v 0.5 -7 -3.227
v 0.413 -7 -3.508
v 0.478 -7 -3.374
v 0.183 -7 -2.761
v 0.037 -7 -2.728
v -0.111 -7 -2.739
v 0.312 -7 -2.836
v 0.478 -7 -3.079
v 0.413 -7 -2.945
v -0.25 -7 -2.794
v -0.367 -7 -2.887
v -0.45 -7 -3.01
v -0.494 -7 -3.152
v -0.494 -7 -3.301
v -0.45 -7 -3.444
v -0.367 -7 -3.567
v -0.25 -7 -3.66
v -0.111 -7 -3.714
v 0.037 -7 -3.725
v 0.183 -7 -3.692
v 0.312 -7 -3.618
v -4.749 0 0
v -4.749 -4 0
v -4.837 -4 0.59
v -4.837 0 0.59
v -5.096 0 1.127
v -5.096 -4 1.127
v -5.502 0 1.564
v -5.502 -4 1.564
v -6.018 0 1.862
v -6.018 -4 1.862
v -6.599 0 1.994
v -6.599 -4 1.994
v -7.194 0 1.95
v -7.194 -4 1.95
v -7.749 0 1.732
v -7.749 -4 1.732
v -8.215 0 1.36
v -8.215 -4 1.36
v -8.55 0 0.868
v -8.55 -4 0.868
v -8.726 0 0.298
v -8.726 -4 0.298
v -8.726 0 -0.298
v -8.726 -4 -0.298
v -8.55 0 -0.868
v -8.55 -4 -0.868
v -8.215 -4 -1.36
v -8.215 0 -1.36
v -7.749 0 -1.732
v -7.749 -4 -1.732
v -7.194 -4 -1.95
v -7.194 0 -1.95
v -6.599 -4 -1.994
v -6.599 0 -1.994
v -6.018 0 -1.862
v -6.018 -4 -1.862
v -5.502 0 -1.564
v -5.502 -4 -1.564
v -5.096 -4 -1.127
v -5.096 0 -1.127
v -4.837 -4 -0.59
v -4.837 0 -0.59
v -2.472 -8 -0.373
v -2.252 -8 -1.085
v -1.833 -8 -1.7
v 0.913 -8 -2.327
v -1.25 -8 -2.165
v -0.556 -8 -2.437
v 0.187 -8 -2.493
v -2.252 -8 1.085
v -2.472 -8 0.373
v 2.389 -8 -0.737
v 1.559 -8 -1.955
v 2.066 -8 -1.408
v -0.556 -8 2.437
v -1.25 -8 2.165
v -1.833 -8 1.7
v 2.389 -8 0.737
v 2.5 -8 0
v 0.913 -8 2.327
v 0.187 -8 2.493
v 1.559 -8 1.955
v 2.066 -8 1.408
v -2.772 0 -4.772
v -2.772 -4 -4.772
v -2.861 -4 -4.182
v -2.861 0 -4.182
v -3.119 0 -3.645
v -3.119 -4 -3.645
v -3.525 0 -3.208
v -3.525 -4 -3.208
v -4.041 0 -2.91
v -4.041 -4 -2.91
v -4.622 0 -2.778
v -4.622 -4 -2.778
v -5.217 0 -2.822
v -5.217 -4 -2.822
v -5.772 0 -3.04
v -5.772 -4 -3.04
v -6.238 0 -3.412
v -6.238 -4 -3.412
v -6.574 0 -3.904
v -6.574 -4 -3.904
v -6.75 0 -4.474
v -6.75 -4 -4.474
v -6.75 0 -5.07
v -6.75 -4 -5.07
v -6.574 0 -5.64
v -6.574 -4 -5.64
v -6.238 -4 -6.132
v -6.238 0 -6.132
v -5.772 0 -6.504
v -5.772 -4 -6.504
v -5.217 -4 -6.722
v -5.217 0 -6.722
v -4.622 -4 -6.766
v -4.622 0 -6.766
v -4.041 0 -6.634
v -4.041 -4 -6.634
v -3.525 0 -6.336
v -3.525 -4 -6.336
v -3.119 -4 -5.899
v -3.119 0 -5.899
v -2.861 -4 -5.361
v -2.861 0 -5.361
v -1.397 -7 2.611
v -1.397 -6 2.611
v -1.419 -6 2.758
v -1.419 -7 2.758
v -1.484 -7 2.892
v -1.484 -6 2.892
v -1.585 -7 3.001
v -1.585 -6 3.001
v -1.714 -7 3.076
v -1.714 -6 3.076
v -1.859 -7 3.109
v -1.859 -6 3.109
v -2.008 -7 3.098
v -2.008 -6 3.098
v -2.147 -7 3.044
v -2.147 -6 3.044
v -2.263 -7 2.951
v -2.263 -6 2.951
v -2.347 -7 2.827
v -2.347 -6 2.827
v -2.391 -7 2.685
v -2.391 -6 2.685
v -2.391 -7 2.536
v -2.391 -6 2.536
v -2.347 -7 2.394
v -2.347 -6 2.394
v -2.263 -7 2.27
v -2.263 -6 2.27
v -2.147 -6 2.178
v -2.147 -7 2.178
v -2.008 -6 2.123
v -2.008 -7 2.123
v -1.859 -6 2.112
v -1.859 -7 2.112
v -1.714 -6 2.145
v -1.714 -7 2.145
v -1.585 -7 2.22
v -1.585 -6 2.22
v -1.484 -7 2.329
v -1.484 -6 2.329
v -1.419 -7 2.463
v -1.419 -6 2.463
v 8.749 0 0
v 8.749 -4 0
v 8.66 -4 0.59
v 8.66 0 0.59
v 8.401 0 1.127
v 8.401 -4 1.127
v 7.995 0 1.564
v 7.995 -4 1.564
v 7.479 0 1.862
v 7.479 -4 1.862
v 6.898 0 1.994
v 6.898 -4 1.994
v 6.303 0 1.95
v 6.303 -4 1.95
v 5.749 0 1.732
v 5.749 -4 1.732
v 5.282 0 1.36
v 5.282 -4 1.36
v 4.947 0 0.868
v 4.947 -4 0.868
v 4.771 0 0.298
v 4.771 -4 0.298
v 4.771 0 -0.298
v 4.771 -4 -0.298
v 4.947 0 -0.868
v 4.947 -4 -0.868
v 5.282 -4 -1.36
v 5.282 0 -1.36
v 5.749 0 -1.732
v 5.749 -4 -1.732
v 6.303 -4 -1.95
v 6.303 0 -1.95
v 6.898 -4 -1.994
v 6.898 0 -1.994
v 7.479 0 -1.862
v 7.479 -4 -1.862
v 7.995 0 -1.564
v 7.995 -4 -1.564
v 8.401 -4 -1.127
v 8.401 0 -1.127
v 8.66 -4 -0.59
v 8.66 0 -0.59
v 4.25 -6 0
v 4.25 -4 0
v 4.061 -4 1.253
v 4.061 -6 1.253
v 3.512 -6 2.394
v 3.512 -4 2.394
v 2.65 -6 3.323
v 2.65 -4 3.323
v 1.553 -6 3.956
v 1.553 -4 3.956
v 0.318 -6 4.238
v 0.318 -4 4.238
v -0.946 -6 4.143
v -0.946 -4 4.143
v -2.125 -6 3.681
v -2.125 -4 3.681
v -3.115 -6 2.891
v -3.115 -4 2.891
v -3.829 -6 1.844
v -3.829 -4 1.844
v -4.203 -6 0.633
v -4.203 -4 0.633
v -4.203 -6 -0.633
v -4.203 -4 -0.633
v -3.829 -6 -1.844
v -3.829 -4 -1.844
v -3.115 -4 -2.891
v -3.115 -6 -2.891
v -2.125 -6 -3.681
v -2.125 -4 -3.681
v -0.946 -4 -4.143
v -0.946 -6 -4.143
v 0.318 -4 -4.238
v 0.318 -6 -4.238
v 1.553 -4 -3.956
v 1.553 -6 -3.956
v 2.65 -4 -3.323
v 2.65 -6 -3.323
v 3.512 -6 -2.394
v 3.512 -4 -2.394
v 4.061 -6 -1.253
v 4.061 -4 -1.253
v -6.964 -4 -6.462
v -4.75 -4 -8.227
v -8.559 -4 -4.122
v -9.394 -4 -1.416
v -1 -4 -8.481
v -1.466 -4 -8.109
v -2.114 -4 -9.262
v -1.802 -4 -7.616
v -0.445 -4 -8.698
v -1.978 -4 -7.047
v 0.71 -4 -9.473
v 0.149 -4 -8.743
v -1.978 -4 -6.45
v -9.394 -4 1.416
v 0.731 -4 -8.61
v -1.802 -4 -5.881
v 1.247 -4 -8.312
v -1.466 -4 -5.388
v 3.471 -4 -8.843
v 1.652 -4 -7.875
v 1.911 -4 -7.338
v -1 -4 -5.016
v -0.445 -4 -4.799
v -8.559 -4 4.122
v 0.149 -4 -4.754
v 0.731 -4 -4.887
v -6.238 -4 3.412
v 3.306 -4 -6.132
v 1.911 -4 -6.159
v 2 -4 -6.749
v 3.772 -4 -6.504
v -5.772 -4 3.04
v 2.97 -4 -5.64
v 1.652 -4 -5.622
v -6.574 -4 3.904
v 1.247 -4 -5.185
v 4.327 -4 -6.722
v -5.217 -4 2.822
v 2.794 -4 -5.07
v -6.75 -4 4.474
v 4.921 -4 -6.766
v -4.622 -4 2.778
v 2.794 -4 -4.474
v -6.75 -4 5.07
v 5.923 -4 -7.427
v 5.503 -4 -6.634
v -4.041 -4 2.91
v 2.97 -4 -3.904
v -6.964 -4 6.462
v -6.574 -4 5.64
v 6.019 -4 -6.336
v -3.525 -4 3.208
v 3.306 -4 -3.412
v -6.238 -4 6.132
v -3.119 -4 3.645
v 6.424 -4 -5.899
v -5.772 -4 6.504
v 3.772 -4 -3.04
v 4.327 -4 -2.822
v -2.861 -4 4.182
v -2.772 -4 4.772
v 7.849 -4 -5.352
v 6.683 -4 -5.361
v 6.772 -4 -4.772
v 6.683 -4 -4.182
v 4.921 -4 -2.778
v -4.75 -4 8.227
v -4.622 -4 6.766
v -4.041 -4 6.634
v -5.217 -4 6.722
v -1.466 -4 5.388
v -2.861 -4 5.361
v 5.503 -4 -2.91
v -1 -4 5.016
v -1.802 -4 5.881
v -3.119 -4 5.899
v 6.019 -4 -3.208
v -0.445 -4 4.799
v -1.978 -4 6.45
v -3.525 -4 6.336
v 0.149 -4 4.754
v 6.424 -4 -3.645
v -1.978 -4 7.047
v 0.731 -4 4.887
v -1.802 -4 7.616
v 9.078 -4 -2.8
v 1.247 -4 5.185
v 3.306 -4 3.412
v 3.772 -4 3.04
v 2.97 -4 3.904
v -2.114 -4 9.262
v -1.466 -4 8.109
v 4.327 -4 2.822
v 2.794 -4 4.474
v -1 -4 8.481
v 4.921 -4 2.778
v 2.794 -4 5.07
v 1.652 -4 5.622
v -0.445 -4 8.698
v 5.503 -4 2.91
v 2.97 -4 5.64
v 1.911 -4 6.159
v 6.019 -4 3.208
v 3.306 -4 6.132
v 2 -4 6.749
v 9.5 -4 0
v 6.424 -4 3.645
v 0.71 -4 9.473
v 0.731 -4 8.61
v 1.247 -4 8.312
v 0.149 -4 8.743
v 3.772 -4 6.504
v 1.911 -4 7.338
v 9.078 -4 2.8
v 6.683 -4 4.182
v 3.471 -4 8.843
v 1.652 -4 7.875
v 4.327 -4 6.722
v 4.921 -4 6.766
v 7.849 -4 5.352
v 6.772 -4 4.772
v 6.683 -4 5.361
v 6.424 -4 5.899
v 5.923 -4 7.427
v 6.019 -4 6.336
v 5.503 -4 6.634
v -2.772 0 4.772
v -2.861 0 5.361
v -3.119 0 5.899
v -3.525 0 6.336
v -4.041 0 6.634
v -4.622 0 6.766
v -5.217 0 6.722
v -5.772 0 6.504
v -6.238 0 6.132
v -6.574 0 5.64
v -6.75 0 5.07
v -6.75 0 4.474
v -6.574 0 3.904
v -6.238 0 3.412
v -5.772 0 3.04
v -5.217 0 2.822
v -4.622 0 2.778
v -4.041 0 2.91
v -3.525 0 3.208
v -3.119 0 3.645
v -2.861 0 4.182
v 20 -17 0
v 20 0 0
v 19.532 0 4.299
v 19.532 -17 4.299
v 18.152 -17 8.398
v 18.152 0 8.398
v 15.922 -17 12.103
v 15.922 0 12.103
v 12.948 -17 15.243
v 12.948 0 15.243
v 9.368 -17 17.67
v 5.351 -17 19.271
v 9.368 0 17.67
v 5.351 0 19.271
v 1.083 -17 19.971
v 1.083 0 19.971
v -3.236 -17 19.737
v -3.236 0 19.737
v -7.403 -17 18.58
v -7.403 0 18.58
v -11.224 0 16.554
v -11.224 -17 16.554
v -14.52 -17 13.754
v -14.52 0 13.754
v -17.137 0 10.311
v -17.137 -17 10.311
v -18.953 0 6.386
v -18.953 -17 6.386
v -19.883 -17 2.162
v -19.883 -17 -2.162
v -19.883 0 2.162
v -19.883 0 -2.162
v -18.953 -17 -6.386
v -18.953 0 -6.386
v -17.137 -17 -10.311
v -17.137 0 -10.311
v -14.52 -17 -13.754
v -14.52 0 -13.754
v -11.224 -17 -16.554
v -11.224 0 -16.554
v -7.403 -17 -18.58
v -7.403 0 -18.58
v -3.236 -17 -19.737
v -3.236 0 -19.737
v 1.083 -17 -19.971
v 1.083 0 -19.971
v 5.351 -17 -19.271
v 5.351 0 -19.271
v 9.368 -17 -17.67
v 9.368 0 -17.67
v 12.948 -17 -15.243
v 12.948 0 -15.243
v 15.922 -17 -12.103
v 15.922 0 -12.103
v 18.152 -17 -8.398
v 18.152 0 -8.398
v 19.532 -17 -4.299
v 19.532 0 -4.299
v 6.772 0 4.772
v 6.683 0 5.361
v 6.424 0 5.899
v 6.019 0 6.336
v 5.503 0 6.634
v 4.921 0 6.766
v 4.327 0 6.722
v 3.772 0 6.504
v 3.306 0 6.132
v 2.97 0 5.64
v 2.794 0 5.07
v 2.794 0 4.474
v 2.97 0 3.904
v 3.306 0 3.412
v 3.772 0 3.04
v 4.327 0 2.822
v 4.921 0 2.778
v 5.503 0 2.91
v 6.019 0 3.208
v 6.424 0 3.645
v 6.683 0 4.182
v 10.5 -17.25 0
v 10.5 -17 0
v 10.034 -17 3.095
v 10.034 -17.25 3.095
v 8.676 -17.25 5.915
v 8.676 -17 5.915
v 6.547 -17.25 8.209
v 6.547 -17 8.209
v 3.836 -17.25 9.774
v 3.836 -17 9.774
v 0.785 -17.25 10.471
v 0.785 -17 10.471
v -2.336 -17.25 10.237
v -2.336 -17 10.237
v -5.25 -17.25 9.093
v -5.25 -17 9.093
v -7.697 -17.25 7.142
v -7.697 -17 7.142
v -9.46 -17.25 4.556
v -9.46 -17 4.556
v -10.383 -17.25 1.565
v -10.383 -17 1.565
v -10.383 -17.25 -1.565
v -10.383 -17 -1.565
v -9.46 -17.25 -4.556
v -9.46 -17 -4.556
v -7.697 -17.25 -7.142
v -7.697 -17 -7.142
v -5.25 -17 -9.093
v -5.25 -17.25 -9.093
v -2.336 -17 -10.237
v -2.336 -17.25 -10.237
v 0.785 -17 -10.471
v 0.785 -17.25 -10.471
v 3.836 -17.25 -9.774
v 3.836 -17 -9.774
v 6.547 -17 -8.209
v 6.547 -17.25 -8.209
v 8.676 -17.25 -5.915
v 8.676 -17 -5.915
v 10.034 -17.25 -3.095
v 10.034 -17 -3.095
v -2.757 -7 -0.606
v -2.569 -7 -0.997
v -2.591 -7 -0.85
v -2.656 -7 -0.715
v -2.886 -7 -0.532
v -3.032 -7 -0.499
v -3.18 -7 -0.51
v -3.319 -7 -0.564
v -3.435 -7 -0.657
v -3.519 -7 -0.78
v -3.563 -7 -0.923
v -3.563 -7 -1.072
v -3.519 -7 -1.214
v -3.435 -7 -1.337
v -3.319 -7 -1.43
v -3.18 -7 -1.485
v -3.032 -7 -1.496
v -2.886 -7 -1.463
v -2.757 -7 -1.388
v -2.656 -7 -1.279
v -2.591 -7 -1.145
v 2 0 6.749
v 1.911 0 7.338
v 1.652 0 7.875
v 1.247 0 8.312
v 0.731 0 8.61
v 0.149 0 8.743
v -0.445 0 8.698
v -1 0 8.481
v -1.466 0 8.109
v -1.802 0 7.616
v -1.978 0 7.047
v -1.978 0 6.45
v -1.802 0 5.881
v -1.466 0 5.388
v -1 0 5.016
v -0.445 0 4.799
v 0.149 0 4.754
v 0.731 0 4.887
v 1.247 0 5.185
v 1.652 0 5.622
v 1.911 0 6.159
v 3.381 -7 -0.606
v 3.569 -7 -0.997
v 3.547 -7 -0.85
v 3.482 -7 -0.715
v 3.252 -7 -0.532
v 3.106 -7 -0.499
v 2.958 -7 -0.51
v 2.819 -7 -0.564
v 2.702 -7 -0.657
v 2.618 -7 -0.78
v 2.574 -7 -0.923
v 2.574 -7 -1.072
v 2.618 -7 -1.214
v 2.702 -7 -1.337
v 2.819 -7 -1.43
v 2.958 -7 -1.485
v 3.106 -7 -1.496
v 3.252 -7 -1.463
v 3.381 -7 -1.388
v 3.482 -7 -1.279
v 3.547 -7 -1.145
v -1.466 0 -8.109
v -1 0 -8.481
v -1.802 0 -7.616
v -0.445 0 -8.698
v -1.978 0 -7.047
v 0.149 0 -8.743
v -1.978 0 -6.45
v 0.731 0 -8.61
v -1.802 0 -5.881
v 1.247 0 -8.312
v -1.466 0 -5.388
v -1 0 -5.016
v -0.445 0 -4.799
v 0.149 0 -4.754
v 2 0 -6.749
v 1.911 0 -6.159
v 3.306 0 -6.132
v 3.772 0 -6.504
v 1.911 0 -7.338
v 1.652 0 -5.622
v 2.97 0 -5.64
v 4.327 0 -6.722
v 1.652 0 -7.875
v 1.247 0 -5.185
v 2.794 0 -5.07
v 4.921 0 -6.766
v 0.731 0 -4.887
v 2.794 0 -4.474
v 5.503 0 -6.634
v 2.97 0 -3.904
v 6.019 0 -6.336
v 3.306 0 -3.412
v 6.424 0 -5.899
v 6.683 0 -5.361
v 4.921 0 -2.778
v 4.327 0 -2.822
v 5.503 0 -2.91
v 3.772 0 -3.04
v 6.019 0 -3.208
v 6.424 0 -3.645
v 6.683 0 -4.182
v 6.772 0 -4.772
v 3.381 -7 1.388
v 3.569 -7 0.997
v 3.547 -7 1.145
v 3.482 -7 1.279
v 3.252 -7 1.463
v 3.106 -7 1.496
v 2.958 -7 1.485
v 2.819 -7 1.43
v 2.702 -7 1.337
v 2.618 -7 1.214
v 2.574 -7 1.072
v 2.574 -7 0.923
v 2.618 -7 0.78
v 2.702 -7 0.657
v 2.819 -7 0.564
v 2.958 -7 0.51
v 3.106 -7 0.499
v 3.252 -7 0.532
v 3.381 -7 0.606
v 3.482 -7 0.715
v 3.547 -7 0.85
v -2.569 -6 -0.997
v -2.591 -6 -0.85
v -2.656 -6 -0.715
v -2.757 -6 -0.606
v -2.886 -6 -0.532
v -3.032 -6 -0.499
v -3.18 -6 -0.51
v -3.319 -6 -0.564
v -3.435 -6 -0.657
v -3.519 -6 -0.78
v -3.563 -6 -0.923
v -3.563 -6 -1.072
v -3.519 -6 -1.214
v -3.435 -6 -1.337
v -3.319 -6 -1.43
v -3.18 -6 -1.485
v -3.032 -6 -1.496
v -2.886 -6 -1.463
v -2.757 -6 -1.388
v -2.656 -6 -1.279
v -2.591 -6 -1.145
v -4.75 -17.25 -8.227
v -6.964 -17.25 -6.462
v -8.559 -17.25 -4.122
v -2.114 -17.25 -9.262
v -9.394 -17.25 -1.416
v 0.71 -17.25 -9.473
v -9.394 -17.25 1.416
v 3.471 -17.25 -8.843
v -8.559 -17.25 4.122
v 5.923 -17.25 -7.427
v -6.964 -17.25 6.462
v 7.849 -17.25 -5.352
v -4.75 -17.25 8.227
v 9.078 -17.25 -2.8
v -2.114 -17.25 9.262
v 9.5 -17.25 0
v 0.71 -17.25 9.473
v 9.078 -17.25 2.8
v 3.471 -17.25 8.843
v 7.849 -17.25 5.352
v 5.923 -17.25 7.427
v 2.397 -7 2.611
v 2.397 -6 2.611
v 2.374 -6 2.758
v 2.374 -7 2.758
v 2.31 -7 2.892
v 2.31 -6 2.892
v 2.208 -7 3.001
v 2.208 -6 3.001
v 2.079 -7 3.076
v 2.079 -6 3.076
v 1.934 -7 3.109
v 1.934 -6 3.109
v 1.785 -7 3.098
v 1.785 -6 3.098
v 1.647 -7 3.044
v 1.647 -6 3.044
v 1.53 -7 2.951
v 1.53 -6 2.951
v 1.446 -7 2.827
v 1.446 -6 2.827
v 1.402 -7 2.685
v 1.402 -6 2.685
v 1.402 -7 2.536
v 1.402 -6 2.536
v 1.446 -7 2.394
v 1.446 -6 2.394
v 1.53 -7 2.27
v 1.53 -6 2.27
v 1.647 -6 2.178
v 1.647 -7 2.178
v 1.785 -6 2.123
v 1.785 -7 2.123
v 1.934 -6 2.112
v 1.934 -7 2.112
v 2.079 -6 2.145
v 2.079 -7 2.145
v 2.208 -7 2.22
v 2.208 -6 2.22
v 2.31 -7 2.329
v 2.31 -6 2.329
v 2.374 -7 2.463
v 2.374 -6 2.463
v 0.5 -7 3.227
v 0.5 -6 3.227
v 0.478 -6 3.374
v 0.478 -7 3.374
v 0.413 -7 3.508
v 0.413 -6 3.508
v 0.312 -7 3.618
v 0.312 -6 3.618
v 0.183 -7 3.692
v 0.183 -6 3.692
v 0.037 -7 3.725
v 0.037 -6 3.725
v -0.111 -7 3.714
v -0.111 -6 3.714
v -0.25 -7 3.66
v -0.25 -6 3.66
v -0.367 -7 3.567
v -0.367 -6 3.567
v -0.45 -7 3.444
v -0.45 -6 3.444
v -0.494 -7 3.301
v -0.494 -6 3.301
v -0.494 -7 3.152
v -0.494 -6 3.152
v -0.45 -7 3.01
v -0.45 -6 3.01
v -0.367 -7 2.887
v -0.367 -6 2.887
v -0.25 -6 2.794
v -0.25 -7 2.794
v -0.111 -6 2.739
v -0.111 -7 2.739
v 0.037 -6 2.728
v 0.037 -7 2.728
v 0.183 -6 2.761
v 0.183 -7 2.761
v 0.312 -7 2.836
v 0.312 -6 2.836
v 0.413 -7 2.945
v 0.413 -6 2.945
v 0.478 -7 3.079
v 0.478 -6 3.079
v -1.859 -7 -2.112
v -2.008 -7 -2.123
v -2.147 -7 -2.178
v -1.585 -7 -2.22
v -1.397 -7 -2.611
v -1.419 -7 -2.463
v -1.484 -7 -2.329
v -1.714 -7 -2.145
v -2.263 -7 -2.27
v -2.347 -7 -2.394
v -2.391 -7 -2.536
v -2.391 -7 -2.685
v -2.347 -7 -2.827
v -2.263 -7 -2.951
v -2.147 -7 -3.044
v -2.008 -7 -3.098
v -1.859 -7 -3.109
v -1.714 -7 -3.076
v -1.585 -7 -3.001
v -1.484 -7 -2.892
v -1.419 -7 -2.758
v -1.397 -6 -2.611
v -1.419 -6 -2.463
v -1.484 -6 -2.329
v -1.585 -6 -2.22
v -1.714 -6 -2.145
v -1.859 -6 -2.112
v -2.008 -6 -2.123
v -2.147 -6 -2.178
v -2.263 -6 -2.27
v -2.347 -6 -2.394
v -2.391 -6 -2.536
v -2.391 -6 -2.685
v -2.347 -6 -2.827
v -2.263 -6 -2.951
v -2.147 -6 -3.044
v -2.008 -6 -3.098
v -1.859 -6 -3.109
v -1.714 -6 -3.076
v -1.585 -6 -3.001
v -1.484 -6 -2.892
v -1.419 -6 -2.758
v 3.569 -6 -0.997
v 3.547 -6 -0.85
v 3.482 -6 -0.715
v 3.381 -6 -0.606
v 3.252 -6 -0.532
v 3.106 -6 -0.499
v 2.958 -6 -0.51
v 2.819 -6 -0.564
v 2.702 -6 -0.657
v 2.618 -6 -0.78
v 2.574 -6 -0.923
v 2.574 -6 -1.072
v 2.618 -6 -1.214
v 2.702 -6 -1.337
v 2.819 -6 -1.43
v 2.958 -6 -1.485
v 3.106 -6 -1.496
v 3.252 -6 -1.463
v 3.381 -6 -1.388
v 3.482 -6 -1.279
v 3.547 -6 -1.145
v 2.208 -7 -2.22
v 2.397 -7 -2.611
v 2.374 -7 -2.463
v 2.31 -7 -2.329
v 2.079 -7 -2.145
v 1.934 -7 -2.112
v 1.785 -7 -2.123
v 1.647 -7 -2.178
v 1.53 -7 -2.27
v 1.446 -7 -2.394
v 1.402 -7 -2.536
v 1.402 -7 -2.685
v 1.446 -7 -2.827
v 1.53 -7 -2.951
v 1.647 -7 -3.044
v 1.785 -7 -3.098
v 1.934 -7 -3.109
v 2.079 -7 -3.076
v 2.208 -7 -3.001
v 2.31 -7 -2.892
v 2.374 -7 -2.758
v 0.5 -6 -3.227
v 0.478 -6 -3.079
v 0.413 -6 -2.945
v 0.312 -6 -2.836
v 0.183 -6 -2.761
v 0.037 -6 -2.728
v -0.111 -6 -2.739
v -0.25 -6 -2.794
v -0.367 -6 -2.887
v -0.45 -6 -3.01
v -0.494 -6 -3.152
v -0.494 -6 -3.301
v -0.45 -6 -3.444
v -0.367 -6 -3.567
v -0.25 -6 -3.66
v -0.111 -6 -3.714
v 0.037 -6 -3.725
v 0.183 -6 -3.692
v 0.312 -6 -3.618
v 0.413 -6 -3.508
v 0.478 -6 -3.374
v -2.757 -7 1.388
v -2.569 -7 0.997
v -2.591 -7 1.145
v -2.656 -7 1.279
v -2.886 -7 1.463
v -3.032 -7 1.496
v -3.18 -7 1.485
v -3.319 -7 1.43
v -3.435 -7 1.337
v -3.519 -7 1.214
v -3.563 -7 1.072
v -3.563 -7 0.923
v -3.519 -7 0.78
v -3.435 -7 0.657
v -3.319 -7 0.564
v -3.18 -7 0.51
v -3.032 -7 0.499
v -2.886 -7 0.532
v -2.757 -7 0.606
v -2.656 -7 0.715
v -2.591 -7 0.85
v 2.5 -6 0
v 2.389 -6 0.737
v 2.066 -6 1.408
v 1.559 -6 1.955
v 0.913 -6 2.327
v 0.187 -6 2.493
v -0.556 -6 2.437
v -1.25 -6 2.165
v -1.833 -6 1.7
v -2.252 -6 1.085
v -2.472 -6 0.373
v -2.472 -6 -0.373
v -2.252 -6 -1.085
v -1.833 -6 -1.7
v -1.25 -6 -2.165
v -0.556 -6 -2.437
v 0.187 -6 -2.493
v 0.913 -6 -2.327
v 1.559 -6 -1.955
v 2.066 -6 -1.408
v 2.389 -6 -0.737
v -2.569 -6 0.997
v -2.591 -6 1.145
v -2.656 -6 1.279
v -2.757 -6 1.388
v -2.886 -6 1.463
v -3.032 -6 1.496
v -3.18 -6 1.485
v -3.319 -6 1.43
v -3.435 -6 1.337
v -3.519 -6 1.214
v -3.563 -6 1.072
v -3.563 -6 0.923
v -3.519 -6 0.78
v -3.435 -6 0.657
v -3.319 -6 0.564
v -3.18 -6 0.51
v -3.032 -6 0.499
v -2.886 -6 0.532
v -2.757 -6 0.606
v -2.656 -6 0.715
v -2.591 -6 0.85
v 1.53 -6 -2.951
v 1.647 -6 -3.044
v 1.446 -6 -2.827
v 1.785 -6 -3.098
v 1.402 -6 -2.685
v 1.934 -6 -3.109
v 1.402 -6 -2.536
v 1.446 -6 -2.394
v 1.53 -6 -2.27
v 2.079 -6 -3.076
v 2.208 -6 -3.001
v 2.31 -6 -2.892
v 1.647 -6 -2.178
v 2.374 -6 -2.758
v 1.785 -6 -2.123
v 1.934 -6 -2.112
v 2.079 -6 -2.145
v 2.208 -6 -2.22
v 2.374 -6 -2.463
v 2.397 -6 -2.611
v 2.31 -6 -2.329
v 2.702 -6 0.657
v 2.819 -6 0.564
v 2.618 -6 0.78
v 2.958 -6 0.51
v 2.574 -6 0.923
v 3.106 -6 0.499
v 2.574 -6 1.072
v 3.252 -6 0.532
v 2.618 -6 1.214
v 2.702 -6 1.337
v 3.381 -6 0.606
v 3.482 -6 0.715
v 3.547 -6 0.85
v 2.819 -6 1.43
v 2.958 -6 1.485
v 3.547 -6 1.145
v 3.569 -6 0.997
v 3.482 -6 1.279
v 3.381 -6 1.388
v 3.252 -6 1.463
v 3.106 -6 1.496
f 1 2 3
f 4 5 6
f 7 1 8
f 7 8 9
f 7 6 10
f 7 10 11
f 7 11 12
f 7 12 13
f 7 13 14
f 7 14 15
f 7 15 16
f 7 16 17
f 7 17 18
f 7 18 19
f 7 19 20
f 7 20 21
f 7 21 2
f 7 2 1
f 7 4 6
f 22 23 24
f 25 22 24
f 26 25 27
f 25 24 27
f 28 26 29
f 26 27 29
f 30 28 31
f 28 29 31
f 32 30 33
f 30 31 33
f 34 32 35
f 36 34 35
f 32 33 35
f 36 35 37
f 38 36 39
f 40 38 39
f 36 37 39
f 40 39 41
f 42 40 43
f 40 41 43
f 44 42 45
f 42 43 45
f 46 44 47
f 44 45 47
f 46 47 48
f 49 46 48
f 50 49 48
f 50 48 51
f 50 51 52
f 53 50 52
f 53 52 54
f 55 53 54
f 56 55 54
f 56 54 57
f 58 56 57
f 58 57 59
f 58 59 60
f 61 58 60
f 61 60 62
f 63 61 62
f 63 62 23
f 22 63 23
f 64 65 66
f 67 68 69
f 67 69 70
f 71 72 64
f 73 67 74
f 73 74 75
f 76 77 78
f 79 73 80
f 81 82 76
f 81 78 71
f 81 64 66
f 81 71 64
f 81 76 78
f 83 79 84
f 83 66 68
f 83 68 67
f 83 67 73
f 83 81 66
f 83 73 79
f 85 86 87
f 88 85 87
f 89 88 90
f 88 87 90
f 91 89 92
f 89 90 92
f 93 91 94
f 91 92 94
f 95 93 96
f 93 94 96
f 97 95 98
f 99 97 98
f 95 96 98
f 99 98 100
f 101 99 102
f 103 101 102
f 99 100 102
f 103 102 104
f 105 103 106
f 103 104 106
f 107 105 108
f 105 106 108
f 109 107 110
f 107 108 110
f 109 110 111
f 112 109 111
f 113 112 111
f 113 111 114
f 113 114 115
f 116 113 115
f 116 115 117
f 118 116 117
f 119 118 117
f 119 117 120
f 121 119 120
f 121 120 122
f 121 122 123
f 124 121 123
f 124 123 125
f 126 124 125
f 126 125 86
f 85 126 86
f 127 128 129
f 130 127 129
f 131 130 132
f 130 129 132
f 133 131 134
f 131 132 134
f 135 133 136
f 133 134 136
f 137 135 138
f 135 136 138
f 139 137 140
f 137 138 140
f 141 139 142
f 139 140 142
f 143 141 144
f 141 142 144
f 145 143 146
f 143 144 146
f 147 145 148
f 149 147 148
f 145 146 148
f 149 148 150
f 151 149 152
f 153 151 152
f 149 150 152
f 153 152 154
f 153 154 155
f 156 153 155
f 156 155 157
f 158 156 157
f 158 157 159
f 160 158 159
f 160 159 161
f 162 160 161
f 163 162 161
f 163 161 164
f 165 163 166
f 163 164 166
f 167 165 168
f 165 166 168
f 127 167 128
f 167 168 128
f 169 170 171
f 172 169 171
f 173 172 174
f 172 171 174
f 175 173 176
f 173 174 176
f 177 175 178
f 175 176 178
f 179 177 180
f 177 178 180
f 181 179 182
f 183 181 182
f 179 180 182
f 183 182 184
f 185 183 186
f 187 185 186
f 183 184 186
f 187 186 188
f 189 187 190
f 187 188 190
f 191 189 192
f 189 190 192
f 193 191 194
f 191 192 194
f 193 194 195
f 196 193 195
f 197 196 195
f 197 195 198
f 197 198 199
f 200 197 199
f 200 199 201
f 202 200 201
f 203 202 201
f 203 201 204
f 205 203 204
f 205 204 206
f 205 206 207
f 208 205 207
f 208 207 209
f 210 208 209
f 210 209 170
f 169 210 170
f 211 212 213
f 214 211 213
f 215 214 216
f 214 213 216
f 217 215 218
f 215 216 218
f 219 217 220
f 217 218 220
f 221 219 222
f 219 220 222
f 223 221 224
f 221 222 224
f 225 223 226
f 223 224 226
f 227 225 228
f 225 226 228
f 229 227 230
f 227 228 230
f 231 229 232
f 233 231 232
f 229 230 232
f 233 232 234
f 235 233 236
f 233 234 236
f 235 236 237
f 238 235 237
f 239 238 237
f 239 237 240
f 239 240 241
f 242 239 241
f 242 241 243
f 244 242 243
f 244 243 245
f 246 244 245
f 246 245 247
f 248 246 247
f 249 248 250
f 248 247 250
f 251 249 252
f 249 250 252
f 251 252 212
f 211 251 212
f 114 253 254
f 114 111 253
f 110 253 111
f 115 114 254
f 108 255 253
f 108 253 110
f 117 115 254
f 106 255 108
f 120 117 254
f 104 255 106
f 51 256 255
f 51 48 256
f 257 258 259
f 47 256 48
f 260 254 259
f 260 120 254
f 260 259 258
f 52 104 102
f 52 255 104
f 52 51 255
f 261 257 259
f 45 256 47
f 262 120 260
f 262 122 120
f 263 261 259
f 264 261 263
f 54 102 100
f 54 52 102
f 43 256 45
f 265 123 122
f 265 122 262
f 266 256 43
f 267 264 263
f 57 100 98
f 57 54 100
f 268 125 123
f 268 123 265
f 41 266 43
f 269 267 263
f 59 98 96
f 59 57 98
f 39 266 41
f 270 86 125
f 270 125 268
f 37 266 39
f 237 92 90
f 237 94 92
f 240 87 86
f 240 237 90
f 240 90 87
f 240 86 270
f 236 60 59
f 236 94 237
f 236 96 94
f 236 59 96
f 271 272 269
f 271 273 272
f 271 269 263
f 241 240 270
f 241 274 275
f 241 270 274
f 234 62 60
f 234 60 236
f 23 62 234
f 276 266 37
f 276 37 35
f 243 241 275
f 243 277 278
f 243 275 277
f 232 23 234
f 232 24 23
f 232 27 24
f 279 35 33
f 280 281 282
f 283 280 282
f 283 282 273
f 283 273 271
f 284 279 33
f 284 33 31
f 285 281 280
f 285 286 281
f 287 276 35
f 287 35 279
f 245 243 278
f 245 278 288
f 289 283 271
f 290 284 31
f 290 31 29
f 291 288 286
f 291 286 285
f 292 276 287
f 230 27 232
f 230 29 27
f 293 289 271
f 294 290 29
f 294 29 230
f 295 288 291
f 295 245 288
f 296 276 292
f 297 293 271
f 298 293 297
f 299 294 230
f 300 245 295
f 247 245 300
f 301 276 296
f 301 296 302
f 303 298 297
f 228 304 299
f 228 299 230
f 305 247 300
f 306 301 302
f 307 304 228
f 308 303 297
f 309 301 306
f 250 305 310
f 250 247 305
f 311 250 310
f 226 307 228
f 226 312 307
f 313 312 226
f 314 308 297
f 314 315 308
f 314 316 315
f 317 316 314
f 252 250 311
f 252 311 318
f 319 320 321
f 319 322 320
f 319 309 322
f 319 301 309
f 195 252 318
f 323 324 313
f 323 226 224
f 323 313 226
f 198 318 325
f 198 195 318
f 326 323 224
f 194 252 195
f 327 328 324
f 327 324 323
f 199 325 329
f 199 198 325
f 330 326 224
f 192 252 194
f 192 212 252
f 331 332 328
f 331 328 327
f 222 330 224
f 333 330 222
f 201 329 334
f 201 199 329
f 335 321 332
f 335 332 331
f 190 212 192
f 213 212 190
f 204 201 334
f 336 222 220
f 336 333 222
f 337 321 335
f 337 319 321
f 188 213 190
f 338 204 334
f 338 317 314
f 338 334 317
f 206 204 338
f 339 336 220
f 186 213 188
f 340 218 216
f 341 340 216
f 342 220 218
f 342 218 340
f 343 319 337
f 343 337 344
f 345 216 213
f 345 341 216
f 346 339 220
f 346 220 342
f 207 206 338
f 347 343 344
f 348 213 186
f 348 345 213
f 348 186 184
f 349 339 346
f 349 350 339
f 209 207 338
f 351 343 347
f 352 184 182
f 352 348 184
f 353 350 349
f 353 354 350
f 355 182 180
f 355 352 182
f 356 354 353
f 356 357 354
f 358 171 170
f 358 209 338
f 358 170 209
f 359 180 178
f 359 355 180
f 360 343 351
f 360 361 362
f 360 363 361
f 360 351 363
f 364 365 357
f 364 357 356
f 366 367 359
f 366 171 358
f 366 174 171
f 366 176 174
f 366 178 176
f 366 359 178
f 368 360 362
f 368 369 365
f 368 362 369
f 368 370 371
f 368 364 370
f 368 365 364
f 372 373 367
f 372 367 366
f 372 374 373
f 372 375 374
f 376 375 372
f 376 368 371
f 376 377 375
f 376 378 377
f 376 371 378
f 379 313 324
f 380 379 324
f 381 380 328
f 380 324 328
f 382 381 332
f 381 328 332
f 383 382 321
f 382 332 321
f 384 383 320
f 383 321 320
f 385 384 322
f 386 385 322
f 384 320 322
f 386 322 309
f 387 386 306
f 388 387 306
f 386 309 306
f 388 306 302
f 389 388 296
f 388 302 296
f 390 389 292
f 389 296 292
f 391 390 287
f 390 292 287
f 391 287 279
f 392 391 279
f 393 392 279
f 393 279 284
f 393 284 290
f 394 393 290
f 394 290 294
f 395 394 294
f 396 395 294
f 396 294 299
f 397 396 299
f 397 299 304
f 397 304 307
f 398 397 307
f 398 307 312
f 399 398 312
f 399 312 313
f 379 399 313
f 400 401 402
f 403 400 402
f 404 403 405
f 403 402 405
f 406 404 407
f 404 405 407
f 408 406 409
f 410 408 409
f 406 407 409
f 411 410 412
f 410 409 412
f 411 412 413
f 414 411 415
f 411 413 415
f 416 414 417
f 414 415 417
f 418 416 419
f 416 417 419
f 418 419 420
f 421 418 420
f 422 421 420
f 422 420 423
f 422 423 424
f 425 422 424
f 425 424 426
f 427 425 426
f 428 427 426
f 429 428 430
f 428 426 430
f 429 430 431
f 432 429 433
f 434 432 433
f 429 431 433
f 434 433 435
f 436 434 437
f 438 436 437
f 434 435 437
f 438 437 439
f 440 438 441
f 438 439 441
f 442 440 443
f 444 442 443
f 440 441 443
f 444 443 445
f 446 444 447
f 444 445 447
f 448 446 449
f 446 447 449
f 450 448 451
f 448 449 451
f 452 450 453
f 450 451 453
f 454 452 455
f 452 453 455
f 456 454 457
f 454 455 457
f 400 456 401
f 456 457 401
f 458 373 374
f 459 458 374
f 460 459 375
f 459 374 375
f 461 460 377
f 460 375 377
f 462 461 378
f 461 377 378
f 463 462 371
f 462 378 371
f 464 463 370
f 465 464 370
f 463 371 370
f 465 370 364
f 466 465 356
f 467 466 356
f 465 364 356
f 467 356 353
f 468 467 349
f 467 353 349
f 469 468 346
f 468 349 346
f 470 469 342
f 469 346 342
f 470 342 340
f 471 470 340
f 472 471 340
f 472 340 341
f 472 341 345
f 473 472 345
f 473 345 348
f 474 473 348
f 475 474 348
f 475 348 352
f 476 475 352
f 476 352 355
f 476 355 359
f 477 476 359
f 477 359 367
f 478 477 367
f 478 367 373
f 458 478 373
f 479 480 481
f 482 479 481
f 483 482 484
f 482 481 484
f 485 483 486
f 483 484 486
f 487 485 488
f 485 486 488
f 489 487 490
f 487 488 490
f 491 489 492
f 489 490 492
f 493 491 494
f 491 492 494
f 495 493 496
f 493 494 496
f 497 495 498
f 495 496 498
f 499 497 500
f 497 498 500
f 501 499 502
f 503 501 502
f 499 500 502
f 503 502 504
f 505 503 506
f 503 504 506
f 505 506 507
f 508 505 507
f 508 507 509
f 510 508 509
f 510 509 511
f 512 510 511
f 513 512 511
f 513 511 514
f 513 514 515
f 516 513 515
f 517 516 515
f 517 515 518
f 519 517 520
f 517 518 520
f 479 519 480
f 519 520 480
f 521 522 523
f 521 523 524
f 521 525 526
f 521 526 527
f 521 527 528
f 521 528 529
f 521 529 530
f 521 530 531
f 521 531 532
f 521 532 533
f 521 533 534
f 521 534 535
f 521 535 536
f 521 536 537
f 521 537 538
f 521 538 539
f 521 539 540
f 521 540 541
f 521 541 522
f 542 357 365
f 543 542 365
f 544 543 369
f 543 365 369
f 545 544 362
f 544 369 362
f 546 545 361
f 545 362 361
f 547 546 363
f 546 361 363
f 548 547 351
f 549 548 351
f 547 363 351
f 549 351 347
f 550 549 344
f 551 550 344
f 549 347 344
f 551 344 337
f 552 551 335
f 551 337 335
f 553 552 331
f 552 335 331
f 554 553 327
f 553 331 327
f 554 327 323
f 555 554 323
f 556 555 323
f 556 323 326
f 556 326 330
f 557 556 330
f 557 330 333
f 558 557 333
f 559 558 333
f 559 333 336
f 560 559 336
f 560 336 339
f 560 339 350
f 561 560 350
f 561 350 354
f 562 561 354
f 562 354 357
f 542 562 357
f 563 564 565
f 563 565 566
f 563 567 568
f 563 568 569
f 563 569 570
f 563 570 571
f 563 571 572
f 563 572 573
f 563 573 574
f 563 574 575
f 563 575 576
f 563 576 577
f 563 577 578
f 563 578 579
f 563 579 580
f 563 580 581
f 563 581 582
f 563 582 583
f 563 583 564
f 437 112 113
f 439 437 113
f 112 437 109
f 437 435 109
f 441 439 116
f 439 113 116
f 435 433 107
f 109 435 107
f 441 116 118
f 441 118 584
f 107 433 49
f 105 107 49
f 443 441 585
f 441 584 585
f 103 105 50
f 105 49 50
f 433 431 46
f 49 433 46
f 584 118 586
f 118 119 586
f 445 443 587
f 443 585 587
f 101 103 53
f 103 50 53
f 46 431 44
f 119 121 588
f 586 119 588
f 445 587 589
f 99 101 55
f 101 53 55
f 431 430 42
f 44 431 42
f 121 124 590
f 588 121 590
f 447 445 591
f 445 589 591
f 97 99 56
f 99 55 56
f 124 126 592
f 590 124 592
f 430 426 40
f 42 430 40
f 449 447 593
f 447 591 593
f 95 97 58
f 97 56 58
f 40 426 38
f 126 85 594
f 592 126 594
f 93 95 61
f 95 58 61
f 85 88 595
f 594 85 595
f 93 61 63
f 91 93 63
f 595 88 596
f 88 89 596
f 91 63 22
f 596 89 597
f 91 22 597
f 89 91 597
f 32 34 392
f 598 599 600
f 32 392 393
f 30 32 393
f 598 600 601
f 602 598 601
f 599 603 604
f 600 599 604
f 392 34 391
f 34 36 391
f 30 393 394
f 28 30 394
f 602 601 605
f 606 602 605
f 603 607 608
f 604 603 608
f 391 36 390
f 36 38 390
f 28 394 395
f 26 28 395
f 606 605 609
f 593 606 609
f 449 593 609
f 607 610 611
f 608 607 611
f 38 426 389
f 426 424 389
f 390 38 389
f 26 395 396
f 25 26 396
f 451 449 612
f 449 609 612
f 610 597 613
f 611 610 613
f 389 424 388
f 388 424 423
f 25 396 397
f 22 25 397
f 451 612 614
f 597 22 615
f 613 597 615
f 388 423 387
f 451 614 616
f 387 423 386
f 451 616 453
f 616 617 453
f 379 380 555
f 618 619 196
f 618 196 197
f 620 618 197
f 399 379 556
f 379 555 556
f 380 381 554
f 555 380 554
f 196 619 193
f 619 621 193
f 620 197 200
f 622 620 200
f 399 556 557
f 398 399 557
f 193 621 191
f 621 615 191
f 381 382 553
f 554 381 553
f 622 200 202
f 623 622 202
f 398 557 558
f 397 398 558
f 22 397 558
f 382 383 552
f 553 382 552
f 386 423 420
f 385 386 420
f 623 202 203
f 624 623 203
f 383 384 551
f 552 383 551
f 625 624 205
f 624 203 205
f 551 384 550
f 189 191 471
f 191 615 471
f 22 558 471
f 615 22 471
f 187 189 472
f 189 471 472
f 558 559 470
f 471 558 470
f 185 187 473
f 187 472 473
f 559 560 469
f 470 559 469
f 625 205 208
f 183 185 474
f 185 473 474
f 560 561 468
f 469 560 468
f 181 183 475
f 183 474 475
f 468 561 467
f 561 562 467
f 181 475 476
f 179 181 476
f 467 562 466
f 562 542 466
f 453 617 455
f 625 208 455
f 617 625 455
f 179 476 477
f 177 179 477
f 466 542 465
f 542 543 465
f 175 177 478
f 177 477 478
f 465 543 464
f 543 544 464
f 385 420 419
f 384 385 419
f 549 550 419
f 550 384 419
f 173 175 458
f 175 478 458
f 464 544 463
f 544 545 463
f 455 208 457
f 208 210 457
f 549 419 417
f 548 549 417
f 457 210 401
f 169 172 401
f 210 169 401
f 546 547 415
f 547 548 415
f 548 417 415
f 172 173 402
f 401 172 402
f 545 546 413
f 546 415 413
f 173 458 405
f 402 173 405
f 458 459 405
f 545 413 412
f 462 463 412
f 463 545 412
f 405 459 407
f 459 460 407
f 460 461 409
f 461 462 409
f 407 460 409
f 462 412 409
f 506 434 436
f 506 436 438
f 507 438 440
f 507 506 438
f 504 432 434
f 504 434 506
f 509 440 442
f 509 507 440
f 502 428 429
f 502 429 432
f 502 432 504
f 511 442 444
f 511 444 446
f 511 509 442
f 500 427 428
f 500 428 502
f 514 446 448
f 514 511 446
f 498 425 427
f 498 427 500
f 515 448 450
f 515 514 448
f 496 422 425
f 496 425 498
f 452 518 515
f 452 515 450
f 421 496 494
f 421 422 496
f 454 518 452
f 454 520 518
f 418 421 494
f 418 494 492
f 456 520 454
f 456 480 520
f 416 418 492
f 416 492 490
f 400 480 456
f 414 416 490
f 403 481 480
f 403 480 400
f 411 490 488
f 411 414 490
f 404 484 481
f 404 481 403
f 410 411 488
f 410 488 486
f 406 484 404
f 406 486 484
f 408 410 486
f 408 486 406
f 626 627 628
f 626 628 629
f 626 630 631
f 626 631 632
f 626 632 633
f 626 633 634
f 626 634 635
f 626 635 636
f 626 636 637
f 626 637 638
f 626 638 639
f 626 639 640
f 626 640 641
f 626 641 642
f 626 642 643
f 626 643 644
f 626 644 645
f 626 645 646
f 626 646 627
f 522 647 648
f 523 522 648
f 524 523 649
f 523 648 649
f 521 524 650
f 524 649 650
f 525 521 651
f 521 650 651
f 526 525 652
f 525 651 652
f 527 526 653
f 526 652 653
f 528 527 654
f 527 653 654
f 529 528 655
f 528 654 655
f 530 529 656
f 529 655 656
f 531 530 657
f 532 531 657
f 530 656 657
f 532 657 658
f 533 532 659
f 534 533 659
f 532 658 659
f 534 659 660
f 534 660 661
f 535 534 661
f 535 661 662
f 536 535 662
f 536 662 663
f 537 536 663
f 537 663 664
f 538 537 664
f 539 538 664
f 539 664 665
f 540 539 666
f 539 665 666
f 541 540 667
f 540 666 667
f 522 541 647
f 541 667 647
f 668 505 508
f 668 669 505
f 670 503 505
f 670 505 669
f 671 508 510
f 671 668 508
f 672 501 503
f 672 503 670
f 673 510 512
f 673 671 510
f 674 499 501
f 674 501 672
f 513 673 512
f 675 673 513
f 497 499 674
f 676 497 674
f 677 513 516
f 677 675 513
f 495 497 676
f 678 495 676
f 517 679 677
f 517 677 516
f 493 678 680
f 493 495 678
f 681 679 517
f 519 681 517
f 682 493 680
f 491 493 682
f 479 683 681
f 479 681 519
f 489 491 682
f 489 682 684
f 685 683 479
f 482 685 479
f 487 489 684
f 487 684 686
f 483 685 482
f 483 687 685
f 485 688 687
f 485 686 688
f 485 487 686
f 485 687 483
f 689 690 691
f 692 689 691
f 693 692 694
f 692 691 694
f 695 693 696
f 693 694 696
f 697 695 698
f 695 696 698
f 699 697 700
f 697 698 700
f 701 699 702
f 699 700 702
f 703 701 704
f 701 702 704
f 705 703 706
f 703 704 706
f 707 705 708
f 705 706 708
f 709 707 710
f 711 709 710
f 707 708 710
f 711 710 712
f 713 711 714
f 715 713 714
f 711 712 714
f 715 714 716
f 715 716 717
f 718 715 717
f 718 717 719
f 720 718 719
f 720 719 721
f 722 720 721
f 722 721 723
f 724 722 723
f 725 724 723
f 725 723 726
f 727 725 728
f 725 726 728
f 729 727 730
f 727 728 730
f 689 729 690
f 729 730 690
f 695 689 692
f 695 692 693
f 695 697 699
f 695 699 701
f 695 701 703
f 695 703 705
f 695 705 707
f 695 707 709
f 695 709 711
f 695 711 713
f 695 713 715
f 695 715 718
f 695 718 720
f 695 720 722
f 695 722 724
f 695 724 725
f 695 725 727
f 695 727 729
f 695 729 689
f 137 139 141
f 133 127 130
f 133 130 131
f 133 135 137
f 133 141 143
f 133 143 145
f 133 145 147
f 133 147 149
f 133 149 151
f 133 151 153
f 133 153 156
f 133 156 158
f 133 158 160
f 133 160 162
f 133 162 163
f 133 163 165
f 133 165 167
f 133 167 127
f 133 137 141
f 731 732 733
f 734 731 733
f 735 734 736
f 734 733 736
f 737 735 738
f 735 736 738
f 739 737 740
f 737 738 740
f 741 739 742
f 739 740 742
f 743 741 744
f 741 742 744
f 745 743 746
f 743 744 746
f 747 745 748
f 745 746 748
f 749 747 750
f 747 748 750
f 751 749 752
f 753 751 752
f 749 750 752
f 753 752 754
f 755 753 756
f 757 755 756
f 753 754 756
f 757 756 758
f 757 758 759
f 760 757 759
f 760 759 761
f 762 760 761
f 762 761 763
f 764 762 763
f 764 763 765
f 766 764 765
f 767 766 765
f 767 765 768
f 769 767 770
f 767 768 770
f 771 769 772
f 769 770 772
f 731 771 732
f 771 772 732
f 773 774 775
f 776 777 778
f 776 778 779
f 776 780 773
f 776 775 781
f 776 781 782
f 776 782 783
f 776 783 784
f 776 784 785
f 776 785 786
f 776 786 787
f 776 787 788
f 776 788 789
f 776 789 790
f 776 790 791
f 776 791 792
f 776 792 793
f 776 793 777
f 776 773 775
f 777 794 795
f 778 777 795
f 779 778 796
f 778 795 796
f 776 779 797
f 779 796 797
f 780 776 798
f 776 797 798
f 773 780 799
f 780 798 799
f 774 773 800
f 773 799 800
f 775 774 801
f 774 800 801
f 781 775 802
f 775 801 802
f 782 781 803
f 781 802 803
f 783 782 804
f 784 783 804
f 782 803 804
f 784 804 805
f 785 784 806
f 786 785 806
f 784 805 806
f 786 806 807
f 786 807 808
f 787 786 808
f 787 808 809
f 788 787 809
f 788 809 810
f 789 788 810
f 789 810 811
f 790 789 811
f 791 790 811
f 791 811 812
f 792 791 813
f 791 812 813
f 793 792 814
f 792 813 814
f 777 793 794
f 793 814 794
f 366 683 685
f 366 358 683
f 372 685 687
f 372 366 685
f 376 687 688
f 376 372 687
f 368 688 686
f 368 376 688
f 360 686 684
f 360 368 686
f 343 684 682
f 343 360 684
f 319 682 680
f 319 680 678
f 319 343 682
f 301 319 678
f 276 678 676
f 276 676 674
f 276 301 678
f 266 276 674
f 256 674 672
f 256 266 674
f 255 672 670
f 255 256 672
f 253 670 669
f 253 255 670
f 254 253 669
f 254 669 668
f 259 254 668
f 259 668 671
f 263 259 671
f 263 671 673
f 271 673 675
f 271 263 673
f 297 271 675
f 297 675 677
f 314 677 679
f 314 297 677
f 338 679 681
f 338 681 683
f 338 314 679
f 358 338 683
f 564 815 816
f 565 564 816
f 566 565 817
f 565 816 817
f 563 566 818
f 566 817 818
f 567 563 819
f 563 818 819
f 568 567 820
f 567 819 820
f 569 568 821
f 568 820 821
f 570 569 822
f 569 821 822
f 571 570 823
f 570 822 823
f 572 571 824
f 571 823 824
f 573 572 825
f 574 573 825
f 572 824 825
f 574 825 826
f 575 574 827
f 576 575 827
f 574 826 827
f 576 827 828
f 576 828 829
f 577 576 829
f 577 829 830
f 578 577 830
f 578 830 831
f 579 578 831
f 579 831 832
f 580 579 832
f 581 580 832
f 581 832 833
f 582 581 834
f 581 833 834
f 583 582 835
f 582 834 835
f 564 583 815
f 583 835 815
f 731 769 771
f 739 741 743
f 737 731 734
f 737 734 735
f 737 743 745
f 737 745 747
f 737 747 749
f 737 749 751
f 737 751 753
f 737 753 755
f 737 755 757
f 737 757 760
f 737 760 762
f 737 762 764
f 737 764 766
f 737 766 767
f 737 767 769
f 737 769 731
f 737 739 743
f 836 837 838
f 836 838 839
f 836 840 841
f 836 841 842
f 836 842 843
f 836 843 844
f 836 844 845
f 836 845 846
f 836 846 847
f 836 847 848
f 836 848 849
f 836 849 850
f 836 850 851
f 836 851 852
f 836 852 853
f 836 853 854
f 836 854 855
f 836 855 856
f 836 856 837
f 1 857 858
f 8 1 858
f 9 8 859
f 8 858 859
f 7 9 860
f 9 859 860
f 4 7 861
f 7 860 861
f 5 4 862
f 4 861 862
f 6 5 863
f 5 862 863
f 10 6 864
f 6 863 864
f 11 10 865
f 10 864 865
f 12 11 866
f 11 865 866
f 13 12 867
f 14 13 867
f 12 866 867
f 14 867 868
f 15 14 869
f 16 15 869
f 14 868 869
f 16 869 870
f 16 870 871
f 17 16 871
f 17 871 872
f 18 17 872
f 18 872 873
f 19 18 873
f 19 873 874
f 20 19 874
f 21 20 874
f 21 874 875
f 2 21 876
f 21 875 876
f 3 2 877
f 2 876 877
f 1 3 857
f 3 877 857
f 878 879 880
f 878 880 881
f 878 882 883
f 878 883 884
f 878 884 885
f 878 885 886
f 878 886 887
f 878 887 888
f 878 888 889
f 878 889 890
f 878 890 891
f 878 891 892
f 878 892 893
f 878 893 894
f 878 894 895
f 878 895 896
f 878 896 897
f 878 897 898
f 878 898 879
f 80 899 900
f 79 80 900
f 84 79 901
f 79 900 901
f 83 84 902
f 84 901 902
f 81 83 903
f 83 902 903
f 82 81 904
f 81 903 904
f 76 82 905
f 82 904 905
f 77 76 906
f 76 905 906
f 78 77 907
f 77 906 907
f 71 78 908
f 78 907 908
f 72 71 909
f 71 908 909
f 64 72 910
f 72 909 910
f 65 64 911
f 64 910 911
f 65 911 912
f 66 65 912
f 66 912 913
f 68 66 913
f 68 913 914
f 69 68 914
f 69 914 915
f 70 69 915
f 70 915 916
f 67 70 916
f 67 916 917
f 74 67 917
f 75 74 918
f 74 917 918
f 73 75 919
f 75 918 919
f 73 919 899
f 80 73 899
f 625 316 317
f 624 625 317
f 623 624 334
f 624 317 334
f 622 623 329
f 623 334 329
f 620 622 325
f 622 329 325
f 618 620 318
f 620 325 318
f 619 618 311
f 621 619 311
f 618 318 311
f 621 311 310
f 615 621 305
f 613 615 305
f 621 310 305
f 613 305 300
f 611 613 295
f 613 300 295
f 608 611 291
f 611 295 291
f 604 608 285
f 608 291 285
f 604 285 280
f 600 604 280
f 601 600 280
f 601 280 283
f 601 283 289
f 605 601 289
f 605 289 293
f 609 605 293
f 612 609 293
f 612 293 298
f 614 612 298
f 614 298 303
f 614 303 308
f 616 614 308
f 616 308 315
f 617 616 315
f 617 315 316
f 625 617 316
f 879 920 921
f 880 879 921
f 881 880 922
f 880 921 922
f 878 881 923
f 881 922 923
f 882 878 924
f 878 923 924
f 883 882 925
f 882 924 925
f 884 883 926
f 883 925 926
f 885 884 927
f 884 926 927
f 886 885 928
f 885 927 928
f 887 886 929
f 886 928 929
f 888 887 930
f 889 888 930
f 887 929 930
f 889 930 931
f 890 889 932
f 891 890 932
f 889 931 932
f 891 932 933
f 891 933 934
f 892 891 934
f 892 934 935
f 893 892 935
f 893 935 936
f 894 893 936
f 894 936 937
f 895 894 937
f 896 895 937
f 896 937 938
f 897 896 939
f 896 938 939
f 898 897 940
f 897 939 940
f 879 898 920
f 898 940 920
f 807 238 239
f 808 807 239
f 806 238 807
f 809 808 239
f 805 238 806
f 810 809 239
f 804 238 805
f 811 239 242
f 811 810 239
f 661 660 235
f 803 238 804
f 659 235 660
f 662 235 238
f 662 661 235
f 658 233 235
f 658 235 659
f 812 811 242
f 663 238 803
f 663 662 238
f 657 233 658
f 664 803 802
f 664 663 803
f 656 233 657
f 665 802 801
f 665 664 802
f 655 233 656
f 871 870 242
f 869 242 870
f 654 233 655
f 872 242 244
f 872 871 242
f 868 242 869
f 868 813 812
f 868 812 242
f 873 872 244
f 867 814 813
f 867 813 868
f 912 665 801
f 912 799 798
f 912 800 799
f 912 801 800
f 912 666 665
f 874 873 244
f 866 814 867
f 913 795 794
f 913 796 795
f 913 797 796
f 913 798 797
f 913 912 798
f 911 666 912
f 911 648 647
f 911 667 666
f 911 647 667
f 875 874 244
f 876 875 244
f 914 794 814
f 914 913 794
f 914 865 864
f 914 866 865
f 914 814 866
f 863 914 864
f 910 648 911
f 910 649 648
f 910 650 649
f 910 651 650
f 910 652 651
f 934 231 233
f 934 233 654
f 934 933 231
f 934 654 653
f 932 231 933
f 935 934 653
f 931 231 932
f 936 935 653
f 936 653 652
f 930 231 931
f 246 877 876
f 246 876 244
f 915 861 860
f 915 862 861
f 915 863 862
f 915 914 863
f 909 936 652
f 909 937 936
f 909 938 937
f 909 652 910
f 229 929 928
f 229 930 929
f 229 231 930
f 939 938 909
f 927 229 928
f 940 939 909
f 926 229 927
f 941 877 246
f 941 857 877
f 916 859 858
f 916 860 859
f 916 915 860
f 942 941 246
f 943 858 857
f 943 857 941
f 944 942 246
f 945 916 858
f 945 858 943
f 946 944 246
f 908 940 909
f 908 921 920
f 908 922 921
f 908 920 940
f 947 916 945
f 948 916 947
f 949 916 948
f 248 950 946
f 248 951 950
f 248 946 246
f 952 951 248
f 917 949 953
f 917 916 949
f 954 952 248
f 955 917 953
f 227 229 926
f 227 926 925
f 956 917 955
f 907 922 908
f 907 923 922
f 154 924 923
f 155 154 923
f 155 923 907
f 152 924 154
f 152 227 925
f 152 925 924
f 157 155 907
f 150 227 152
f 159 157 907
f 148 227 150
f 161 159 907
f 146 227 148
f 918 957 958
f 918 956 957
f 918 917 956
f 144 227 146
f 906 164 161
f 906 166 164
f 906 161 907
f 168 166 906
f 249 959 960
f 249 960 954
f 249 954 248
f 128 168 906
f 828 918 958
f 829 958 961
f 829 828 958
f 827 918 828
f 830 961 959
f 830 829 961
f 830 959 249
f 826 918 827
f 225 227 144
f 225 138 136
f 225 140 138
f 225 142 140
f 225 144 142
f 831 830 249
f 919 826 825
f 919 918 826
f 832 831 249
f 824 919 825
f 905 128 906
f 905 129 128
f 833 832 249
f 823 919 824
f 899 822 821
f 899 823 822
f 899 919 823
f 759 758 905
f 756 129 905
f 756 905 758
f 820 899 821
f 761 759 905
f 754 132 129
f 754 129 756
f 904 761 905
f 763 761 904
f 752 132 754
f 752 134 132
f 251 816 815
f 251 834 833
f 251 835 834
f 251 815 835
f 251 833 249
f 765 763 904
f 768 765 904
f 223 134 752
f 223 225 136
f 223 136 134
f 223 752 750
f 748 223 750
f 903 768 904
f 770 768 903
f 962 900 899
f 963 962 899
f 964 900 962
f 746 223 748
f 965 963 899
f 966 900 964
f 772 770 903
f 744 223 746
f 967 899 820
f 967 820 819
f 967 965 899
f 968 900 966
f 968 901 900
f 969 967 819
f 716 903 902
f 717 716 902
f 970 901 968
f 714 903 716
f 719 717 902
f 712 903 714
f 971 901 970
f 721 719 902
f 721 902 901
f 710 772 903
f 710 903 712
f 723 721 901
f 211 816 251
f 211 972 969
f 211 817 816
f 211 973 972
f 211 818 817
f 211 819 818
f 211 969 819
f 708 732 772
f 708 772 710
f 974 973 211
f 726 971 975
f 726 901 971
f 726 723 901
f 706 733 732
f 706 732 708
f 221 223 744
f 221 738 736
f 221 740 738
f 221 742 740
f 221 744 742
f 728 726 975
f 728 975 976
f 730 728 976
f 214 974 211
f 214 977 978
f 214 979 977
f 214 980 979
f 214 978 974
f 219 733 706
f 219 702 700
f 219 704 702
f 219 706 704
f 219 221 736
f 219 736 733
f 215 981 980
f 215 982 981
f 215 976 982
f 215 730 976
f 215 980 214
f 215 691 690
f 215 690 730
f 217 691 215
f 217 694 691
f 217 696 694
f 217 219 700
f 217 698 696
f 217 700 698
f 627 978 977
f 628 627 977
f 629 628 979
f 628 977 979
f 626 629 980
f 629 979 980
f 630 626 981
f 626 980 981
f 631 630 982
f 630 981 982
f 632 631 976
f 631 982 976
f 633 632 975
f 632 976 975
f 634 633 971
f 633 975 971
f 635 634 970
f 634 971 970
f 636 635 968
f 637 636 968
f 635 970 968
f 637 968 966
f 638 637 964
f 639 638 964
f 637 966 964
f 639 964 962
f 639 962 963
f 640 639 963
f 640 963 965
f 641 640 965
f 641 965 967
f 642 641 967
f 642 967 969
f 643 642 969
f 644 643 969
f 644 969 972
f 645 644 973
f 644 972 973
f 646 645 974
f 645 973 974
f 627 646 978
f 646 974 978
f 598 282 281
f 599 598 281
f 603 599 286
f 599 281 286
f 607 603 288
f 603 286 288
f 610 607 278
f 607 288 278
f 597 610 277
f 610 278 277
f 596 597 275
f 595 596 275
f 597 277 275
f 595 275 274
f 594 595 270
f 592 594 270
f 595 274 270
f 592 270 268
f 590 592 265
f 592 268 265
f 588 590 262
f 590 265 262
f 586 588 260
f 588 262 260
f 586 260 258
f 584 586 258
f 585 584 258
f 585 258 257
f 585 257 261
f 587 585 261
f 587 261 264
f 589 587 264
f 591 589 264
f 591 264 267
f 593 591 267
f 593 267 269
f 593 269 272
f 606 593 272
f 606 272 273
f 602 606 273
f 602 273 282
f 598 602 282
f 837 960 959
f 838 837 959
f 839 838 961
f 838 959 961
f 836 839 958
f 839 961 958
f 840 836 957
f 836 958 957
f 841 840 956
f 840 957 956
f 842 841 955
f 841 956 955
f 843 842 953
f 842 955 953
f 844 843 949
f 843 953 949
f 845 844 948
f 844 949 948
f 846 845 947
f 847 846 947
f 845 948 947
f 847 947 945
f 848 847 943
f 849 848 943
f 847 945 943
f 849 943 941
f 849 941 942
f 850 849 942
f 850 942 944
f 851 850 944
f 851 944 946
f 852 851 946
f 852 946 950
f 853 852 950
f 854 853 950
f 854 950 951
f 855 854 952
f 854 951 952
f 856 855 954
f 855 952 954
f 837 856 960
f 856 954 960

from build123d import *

# Parameters (mm, degrees)
F0_R      = 20
F1_DEPTH  = 17
F2_R      = 9.5
F3_DEPTH  = 13
F2_R_2    = 10.5
F4_DEPTH  = 0.25
F5_R      = 2
F6_DEPTH  = 25
F7_R      = 4.25
F8_DEPTH  = 2
F9_R      = 2.5
F10_DEPTH = 2
F11_R     = 0.5
F12_DEPTH = 1


# Not quite as in the source:
# - a feature names something its author has since deleted; it is built from what else it names


with BuildPart() as f1:
    # F0 (on Front) → F1 (new body)
    with BuildSketch(Plane.XZ):
        Circle(F0_R)
    extrude(amount=F1_DEPTH)

    # F2 (on face) → F3 (cut)
    with BuildSketch(Plane.XZ.offset(17)):
        Circle(F2_R)
    extrude(amount=-F3_DEPTH, mode=Mode.SUBTRACT)

    # F2 (on face) → F4 (join)
    with BuildSketch(Plane.XZ.offset(17)):
        Circle(F2_R_2)
        Circle(F2_R, mode=Mode.SUBTRACT)
    extrude(amount=F4_DEPTH)

    # F5 (on face) → F6 (cut)
    with BuildSketch(Plane.XZ.offset(4)):
        with Locations((0, 6.7485035397)):
            Circle(F5_R)
        with Locations((4.7719126158, 4.7719126158)):
            Circle(F5_R)
        with Locations((6.7485035397, 0)):
            Circle(F5_R)
        with Locations((4.7719126158, -4.7719126158)):
            Circle(F5_R)
        with Locations((0, -6.7485035397)):
            Circle(F5_R)
        with Locations((-4.7719126158, -4.7719126158)):
            Circle(F5_R)
        with Locations((-6.7485035397, 0)):
            Circle(F5_R)
        with Locations((-4.7719126158, 4.7719126158)):
            Circle(F5_R)
    extrude(amount=-F6_DEPTH, mode=Mode.SUBTRACT)

    # F7 (on face) → F8 (join)
    with BuildSketch(Plane.XZ.offset(4)):
        Circle(F7_R)
    extrude(amount=F8_DEPTH)

    # F9 (on face) → F10 (join)
    with BuildSketch(Plane.XZ.offset(6)):
        Circle(F9_R)
    extrude(amount=F10_DEPTH)

    # F11 (on face) → F12 (join)
    with BuildSketch(Plane.XZ.offset(6)):
        with Locations((0, 3.2268003561)):
            Circle(F11_R)
        with Locations((1.8966656614, 2.6105363255)):
            Circle(F11_R)
        with Locations((3.0688695054, -0.9971361475)):
            Circle(F11_R)
        with Locations((3.0688695054, 0.9971361475)):
            Circle(F11_R)
        with Locations((1.8966656614, -2.6105363255)):
            Circle(F11_R)
        with Locations((0, -3.2268003561)):
            Circle(F11_R)
        with Locations((-1.8966656614, -2.6105363255)):
            Circle(F11_R)
        with Locations((-3.0688695054, -0.9971361475)):
            Circle(F11_R)
        with Locations((-3.0688695054, 0.9971361475)):
            Circle(F11_R)
        with Locations((-1.8966656614, 2.6105363255)):
            Circle(F11_R)
    extrude(amount=F12_DEPTH)


solid = f1.part
